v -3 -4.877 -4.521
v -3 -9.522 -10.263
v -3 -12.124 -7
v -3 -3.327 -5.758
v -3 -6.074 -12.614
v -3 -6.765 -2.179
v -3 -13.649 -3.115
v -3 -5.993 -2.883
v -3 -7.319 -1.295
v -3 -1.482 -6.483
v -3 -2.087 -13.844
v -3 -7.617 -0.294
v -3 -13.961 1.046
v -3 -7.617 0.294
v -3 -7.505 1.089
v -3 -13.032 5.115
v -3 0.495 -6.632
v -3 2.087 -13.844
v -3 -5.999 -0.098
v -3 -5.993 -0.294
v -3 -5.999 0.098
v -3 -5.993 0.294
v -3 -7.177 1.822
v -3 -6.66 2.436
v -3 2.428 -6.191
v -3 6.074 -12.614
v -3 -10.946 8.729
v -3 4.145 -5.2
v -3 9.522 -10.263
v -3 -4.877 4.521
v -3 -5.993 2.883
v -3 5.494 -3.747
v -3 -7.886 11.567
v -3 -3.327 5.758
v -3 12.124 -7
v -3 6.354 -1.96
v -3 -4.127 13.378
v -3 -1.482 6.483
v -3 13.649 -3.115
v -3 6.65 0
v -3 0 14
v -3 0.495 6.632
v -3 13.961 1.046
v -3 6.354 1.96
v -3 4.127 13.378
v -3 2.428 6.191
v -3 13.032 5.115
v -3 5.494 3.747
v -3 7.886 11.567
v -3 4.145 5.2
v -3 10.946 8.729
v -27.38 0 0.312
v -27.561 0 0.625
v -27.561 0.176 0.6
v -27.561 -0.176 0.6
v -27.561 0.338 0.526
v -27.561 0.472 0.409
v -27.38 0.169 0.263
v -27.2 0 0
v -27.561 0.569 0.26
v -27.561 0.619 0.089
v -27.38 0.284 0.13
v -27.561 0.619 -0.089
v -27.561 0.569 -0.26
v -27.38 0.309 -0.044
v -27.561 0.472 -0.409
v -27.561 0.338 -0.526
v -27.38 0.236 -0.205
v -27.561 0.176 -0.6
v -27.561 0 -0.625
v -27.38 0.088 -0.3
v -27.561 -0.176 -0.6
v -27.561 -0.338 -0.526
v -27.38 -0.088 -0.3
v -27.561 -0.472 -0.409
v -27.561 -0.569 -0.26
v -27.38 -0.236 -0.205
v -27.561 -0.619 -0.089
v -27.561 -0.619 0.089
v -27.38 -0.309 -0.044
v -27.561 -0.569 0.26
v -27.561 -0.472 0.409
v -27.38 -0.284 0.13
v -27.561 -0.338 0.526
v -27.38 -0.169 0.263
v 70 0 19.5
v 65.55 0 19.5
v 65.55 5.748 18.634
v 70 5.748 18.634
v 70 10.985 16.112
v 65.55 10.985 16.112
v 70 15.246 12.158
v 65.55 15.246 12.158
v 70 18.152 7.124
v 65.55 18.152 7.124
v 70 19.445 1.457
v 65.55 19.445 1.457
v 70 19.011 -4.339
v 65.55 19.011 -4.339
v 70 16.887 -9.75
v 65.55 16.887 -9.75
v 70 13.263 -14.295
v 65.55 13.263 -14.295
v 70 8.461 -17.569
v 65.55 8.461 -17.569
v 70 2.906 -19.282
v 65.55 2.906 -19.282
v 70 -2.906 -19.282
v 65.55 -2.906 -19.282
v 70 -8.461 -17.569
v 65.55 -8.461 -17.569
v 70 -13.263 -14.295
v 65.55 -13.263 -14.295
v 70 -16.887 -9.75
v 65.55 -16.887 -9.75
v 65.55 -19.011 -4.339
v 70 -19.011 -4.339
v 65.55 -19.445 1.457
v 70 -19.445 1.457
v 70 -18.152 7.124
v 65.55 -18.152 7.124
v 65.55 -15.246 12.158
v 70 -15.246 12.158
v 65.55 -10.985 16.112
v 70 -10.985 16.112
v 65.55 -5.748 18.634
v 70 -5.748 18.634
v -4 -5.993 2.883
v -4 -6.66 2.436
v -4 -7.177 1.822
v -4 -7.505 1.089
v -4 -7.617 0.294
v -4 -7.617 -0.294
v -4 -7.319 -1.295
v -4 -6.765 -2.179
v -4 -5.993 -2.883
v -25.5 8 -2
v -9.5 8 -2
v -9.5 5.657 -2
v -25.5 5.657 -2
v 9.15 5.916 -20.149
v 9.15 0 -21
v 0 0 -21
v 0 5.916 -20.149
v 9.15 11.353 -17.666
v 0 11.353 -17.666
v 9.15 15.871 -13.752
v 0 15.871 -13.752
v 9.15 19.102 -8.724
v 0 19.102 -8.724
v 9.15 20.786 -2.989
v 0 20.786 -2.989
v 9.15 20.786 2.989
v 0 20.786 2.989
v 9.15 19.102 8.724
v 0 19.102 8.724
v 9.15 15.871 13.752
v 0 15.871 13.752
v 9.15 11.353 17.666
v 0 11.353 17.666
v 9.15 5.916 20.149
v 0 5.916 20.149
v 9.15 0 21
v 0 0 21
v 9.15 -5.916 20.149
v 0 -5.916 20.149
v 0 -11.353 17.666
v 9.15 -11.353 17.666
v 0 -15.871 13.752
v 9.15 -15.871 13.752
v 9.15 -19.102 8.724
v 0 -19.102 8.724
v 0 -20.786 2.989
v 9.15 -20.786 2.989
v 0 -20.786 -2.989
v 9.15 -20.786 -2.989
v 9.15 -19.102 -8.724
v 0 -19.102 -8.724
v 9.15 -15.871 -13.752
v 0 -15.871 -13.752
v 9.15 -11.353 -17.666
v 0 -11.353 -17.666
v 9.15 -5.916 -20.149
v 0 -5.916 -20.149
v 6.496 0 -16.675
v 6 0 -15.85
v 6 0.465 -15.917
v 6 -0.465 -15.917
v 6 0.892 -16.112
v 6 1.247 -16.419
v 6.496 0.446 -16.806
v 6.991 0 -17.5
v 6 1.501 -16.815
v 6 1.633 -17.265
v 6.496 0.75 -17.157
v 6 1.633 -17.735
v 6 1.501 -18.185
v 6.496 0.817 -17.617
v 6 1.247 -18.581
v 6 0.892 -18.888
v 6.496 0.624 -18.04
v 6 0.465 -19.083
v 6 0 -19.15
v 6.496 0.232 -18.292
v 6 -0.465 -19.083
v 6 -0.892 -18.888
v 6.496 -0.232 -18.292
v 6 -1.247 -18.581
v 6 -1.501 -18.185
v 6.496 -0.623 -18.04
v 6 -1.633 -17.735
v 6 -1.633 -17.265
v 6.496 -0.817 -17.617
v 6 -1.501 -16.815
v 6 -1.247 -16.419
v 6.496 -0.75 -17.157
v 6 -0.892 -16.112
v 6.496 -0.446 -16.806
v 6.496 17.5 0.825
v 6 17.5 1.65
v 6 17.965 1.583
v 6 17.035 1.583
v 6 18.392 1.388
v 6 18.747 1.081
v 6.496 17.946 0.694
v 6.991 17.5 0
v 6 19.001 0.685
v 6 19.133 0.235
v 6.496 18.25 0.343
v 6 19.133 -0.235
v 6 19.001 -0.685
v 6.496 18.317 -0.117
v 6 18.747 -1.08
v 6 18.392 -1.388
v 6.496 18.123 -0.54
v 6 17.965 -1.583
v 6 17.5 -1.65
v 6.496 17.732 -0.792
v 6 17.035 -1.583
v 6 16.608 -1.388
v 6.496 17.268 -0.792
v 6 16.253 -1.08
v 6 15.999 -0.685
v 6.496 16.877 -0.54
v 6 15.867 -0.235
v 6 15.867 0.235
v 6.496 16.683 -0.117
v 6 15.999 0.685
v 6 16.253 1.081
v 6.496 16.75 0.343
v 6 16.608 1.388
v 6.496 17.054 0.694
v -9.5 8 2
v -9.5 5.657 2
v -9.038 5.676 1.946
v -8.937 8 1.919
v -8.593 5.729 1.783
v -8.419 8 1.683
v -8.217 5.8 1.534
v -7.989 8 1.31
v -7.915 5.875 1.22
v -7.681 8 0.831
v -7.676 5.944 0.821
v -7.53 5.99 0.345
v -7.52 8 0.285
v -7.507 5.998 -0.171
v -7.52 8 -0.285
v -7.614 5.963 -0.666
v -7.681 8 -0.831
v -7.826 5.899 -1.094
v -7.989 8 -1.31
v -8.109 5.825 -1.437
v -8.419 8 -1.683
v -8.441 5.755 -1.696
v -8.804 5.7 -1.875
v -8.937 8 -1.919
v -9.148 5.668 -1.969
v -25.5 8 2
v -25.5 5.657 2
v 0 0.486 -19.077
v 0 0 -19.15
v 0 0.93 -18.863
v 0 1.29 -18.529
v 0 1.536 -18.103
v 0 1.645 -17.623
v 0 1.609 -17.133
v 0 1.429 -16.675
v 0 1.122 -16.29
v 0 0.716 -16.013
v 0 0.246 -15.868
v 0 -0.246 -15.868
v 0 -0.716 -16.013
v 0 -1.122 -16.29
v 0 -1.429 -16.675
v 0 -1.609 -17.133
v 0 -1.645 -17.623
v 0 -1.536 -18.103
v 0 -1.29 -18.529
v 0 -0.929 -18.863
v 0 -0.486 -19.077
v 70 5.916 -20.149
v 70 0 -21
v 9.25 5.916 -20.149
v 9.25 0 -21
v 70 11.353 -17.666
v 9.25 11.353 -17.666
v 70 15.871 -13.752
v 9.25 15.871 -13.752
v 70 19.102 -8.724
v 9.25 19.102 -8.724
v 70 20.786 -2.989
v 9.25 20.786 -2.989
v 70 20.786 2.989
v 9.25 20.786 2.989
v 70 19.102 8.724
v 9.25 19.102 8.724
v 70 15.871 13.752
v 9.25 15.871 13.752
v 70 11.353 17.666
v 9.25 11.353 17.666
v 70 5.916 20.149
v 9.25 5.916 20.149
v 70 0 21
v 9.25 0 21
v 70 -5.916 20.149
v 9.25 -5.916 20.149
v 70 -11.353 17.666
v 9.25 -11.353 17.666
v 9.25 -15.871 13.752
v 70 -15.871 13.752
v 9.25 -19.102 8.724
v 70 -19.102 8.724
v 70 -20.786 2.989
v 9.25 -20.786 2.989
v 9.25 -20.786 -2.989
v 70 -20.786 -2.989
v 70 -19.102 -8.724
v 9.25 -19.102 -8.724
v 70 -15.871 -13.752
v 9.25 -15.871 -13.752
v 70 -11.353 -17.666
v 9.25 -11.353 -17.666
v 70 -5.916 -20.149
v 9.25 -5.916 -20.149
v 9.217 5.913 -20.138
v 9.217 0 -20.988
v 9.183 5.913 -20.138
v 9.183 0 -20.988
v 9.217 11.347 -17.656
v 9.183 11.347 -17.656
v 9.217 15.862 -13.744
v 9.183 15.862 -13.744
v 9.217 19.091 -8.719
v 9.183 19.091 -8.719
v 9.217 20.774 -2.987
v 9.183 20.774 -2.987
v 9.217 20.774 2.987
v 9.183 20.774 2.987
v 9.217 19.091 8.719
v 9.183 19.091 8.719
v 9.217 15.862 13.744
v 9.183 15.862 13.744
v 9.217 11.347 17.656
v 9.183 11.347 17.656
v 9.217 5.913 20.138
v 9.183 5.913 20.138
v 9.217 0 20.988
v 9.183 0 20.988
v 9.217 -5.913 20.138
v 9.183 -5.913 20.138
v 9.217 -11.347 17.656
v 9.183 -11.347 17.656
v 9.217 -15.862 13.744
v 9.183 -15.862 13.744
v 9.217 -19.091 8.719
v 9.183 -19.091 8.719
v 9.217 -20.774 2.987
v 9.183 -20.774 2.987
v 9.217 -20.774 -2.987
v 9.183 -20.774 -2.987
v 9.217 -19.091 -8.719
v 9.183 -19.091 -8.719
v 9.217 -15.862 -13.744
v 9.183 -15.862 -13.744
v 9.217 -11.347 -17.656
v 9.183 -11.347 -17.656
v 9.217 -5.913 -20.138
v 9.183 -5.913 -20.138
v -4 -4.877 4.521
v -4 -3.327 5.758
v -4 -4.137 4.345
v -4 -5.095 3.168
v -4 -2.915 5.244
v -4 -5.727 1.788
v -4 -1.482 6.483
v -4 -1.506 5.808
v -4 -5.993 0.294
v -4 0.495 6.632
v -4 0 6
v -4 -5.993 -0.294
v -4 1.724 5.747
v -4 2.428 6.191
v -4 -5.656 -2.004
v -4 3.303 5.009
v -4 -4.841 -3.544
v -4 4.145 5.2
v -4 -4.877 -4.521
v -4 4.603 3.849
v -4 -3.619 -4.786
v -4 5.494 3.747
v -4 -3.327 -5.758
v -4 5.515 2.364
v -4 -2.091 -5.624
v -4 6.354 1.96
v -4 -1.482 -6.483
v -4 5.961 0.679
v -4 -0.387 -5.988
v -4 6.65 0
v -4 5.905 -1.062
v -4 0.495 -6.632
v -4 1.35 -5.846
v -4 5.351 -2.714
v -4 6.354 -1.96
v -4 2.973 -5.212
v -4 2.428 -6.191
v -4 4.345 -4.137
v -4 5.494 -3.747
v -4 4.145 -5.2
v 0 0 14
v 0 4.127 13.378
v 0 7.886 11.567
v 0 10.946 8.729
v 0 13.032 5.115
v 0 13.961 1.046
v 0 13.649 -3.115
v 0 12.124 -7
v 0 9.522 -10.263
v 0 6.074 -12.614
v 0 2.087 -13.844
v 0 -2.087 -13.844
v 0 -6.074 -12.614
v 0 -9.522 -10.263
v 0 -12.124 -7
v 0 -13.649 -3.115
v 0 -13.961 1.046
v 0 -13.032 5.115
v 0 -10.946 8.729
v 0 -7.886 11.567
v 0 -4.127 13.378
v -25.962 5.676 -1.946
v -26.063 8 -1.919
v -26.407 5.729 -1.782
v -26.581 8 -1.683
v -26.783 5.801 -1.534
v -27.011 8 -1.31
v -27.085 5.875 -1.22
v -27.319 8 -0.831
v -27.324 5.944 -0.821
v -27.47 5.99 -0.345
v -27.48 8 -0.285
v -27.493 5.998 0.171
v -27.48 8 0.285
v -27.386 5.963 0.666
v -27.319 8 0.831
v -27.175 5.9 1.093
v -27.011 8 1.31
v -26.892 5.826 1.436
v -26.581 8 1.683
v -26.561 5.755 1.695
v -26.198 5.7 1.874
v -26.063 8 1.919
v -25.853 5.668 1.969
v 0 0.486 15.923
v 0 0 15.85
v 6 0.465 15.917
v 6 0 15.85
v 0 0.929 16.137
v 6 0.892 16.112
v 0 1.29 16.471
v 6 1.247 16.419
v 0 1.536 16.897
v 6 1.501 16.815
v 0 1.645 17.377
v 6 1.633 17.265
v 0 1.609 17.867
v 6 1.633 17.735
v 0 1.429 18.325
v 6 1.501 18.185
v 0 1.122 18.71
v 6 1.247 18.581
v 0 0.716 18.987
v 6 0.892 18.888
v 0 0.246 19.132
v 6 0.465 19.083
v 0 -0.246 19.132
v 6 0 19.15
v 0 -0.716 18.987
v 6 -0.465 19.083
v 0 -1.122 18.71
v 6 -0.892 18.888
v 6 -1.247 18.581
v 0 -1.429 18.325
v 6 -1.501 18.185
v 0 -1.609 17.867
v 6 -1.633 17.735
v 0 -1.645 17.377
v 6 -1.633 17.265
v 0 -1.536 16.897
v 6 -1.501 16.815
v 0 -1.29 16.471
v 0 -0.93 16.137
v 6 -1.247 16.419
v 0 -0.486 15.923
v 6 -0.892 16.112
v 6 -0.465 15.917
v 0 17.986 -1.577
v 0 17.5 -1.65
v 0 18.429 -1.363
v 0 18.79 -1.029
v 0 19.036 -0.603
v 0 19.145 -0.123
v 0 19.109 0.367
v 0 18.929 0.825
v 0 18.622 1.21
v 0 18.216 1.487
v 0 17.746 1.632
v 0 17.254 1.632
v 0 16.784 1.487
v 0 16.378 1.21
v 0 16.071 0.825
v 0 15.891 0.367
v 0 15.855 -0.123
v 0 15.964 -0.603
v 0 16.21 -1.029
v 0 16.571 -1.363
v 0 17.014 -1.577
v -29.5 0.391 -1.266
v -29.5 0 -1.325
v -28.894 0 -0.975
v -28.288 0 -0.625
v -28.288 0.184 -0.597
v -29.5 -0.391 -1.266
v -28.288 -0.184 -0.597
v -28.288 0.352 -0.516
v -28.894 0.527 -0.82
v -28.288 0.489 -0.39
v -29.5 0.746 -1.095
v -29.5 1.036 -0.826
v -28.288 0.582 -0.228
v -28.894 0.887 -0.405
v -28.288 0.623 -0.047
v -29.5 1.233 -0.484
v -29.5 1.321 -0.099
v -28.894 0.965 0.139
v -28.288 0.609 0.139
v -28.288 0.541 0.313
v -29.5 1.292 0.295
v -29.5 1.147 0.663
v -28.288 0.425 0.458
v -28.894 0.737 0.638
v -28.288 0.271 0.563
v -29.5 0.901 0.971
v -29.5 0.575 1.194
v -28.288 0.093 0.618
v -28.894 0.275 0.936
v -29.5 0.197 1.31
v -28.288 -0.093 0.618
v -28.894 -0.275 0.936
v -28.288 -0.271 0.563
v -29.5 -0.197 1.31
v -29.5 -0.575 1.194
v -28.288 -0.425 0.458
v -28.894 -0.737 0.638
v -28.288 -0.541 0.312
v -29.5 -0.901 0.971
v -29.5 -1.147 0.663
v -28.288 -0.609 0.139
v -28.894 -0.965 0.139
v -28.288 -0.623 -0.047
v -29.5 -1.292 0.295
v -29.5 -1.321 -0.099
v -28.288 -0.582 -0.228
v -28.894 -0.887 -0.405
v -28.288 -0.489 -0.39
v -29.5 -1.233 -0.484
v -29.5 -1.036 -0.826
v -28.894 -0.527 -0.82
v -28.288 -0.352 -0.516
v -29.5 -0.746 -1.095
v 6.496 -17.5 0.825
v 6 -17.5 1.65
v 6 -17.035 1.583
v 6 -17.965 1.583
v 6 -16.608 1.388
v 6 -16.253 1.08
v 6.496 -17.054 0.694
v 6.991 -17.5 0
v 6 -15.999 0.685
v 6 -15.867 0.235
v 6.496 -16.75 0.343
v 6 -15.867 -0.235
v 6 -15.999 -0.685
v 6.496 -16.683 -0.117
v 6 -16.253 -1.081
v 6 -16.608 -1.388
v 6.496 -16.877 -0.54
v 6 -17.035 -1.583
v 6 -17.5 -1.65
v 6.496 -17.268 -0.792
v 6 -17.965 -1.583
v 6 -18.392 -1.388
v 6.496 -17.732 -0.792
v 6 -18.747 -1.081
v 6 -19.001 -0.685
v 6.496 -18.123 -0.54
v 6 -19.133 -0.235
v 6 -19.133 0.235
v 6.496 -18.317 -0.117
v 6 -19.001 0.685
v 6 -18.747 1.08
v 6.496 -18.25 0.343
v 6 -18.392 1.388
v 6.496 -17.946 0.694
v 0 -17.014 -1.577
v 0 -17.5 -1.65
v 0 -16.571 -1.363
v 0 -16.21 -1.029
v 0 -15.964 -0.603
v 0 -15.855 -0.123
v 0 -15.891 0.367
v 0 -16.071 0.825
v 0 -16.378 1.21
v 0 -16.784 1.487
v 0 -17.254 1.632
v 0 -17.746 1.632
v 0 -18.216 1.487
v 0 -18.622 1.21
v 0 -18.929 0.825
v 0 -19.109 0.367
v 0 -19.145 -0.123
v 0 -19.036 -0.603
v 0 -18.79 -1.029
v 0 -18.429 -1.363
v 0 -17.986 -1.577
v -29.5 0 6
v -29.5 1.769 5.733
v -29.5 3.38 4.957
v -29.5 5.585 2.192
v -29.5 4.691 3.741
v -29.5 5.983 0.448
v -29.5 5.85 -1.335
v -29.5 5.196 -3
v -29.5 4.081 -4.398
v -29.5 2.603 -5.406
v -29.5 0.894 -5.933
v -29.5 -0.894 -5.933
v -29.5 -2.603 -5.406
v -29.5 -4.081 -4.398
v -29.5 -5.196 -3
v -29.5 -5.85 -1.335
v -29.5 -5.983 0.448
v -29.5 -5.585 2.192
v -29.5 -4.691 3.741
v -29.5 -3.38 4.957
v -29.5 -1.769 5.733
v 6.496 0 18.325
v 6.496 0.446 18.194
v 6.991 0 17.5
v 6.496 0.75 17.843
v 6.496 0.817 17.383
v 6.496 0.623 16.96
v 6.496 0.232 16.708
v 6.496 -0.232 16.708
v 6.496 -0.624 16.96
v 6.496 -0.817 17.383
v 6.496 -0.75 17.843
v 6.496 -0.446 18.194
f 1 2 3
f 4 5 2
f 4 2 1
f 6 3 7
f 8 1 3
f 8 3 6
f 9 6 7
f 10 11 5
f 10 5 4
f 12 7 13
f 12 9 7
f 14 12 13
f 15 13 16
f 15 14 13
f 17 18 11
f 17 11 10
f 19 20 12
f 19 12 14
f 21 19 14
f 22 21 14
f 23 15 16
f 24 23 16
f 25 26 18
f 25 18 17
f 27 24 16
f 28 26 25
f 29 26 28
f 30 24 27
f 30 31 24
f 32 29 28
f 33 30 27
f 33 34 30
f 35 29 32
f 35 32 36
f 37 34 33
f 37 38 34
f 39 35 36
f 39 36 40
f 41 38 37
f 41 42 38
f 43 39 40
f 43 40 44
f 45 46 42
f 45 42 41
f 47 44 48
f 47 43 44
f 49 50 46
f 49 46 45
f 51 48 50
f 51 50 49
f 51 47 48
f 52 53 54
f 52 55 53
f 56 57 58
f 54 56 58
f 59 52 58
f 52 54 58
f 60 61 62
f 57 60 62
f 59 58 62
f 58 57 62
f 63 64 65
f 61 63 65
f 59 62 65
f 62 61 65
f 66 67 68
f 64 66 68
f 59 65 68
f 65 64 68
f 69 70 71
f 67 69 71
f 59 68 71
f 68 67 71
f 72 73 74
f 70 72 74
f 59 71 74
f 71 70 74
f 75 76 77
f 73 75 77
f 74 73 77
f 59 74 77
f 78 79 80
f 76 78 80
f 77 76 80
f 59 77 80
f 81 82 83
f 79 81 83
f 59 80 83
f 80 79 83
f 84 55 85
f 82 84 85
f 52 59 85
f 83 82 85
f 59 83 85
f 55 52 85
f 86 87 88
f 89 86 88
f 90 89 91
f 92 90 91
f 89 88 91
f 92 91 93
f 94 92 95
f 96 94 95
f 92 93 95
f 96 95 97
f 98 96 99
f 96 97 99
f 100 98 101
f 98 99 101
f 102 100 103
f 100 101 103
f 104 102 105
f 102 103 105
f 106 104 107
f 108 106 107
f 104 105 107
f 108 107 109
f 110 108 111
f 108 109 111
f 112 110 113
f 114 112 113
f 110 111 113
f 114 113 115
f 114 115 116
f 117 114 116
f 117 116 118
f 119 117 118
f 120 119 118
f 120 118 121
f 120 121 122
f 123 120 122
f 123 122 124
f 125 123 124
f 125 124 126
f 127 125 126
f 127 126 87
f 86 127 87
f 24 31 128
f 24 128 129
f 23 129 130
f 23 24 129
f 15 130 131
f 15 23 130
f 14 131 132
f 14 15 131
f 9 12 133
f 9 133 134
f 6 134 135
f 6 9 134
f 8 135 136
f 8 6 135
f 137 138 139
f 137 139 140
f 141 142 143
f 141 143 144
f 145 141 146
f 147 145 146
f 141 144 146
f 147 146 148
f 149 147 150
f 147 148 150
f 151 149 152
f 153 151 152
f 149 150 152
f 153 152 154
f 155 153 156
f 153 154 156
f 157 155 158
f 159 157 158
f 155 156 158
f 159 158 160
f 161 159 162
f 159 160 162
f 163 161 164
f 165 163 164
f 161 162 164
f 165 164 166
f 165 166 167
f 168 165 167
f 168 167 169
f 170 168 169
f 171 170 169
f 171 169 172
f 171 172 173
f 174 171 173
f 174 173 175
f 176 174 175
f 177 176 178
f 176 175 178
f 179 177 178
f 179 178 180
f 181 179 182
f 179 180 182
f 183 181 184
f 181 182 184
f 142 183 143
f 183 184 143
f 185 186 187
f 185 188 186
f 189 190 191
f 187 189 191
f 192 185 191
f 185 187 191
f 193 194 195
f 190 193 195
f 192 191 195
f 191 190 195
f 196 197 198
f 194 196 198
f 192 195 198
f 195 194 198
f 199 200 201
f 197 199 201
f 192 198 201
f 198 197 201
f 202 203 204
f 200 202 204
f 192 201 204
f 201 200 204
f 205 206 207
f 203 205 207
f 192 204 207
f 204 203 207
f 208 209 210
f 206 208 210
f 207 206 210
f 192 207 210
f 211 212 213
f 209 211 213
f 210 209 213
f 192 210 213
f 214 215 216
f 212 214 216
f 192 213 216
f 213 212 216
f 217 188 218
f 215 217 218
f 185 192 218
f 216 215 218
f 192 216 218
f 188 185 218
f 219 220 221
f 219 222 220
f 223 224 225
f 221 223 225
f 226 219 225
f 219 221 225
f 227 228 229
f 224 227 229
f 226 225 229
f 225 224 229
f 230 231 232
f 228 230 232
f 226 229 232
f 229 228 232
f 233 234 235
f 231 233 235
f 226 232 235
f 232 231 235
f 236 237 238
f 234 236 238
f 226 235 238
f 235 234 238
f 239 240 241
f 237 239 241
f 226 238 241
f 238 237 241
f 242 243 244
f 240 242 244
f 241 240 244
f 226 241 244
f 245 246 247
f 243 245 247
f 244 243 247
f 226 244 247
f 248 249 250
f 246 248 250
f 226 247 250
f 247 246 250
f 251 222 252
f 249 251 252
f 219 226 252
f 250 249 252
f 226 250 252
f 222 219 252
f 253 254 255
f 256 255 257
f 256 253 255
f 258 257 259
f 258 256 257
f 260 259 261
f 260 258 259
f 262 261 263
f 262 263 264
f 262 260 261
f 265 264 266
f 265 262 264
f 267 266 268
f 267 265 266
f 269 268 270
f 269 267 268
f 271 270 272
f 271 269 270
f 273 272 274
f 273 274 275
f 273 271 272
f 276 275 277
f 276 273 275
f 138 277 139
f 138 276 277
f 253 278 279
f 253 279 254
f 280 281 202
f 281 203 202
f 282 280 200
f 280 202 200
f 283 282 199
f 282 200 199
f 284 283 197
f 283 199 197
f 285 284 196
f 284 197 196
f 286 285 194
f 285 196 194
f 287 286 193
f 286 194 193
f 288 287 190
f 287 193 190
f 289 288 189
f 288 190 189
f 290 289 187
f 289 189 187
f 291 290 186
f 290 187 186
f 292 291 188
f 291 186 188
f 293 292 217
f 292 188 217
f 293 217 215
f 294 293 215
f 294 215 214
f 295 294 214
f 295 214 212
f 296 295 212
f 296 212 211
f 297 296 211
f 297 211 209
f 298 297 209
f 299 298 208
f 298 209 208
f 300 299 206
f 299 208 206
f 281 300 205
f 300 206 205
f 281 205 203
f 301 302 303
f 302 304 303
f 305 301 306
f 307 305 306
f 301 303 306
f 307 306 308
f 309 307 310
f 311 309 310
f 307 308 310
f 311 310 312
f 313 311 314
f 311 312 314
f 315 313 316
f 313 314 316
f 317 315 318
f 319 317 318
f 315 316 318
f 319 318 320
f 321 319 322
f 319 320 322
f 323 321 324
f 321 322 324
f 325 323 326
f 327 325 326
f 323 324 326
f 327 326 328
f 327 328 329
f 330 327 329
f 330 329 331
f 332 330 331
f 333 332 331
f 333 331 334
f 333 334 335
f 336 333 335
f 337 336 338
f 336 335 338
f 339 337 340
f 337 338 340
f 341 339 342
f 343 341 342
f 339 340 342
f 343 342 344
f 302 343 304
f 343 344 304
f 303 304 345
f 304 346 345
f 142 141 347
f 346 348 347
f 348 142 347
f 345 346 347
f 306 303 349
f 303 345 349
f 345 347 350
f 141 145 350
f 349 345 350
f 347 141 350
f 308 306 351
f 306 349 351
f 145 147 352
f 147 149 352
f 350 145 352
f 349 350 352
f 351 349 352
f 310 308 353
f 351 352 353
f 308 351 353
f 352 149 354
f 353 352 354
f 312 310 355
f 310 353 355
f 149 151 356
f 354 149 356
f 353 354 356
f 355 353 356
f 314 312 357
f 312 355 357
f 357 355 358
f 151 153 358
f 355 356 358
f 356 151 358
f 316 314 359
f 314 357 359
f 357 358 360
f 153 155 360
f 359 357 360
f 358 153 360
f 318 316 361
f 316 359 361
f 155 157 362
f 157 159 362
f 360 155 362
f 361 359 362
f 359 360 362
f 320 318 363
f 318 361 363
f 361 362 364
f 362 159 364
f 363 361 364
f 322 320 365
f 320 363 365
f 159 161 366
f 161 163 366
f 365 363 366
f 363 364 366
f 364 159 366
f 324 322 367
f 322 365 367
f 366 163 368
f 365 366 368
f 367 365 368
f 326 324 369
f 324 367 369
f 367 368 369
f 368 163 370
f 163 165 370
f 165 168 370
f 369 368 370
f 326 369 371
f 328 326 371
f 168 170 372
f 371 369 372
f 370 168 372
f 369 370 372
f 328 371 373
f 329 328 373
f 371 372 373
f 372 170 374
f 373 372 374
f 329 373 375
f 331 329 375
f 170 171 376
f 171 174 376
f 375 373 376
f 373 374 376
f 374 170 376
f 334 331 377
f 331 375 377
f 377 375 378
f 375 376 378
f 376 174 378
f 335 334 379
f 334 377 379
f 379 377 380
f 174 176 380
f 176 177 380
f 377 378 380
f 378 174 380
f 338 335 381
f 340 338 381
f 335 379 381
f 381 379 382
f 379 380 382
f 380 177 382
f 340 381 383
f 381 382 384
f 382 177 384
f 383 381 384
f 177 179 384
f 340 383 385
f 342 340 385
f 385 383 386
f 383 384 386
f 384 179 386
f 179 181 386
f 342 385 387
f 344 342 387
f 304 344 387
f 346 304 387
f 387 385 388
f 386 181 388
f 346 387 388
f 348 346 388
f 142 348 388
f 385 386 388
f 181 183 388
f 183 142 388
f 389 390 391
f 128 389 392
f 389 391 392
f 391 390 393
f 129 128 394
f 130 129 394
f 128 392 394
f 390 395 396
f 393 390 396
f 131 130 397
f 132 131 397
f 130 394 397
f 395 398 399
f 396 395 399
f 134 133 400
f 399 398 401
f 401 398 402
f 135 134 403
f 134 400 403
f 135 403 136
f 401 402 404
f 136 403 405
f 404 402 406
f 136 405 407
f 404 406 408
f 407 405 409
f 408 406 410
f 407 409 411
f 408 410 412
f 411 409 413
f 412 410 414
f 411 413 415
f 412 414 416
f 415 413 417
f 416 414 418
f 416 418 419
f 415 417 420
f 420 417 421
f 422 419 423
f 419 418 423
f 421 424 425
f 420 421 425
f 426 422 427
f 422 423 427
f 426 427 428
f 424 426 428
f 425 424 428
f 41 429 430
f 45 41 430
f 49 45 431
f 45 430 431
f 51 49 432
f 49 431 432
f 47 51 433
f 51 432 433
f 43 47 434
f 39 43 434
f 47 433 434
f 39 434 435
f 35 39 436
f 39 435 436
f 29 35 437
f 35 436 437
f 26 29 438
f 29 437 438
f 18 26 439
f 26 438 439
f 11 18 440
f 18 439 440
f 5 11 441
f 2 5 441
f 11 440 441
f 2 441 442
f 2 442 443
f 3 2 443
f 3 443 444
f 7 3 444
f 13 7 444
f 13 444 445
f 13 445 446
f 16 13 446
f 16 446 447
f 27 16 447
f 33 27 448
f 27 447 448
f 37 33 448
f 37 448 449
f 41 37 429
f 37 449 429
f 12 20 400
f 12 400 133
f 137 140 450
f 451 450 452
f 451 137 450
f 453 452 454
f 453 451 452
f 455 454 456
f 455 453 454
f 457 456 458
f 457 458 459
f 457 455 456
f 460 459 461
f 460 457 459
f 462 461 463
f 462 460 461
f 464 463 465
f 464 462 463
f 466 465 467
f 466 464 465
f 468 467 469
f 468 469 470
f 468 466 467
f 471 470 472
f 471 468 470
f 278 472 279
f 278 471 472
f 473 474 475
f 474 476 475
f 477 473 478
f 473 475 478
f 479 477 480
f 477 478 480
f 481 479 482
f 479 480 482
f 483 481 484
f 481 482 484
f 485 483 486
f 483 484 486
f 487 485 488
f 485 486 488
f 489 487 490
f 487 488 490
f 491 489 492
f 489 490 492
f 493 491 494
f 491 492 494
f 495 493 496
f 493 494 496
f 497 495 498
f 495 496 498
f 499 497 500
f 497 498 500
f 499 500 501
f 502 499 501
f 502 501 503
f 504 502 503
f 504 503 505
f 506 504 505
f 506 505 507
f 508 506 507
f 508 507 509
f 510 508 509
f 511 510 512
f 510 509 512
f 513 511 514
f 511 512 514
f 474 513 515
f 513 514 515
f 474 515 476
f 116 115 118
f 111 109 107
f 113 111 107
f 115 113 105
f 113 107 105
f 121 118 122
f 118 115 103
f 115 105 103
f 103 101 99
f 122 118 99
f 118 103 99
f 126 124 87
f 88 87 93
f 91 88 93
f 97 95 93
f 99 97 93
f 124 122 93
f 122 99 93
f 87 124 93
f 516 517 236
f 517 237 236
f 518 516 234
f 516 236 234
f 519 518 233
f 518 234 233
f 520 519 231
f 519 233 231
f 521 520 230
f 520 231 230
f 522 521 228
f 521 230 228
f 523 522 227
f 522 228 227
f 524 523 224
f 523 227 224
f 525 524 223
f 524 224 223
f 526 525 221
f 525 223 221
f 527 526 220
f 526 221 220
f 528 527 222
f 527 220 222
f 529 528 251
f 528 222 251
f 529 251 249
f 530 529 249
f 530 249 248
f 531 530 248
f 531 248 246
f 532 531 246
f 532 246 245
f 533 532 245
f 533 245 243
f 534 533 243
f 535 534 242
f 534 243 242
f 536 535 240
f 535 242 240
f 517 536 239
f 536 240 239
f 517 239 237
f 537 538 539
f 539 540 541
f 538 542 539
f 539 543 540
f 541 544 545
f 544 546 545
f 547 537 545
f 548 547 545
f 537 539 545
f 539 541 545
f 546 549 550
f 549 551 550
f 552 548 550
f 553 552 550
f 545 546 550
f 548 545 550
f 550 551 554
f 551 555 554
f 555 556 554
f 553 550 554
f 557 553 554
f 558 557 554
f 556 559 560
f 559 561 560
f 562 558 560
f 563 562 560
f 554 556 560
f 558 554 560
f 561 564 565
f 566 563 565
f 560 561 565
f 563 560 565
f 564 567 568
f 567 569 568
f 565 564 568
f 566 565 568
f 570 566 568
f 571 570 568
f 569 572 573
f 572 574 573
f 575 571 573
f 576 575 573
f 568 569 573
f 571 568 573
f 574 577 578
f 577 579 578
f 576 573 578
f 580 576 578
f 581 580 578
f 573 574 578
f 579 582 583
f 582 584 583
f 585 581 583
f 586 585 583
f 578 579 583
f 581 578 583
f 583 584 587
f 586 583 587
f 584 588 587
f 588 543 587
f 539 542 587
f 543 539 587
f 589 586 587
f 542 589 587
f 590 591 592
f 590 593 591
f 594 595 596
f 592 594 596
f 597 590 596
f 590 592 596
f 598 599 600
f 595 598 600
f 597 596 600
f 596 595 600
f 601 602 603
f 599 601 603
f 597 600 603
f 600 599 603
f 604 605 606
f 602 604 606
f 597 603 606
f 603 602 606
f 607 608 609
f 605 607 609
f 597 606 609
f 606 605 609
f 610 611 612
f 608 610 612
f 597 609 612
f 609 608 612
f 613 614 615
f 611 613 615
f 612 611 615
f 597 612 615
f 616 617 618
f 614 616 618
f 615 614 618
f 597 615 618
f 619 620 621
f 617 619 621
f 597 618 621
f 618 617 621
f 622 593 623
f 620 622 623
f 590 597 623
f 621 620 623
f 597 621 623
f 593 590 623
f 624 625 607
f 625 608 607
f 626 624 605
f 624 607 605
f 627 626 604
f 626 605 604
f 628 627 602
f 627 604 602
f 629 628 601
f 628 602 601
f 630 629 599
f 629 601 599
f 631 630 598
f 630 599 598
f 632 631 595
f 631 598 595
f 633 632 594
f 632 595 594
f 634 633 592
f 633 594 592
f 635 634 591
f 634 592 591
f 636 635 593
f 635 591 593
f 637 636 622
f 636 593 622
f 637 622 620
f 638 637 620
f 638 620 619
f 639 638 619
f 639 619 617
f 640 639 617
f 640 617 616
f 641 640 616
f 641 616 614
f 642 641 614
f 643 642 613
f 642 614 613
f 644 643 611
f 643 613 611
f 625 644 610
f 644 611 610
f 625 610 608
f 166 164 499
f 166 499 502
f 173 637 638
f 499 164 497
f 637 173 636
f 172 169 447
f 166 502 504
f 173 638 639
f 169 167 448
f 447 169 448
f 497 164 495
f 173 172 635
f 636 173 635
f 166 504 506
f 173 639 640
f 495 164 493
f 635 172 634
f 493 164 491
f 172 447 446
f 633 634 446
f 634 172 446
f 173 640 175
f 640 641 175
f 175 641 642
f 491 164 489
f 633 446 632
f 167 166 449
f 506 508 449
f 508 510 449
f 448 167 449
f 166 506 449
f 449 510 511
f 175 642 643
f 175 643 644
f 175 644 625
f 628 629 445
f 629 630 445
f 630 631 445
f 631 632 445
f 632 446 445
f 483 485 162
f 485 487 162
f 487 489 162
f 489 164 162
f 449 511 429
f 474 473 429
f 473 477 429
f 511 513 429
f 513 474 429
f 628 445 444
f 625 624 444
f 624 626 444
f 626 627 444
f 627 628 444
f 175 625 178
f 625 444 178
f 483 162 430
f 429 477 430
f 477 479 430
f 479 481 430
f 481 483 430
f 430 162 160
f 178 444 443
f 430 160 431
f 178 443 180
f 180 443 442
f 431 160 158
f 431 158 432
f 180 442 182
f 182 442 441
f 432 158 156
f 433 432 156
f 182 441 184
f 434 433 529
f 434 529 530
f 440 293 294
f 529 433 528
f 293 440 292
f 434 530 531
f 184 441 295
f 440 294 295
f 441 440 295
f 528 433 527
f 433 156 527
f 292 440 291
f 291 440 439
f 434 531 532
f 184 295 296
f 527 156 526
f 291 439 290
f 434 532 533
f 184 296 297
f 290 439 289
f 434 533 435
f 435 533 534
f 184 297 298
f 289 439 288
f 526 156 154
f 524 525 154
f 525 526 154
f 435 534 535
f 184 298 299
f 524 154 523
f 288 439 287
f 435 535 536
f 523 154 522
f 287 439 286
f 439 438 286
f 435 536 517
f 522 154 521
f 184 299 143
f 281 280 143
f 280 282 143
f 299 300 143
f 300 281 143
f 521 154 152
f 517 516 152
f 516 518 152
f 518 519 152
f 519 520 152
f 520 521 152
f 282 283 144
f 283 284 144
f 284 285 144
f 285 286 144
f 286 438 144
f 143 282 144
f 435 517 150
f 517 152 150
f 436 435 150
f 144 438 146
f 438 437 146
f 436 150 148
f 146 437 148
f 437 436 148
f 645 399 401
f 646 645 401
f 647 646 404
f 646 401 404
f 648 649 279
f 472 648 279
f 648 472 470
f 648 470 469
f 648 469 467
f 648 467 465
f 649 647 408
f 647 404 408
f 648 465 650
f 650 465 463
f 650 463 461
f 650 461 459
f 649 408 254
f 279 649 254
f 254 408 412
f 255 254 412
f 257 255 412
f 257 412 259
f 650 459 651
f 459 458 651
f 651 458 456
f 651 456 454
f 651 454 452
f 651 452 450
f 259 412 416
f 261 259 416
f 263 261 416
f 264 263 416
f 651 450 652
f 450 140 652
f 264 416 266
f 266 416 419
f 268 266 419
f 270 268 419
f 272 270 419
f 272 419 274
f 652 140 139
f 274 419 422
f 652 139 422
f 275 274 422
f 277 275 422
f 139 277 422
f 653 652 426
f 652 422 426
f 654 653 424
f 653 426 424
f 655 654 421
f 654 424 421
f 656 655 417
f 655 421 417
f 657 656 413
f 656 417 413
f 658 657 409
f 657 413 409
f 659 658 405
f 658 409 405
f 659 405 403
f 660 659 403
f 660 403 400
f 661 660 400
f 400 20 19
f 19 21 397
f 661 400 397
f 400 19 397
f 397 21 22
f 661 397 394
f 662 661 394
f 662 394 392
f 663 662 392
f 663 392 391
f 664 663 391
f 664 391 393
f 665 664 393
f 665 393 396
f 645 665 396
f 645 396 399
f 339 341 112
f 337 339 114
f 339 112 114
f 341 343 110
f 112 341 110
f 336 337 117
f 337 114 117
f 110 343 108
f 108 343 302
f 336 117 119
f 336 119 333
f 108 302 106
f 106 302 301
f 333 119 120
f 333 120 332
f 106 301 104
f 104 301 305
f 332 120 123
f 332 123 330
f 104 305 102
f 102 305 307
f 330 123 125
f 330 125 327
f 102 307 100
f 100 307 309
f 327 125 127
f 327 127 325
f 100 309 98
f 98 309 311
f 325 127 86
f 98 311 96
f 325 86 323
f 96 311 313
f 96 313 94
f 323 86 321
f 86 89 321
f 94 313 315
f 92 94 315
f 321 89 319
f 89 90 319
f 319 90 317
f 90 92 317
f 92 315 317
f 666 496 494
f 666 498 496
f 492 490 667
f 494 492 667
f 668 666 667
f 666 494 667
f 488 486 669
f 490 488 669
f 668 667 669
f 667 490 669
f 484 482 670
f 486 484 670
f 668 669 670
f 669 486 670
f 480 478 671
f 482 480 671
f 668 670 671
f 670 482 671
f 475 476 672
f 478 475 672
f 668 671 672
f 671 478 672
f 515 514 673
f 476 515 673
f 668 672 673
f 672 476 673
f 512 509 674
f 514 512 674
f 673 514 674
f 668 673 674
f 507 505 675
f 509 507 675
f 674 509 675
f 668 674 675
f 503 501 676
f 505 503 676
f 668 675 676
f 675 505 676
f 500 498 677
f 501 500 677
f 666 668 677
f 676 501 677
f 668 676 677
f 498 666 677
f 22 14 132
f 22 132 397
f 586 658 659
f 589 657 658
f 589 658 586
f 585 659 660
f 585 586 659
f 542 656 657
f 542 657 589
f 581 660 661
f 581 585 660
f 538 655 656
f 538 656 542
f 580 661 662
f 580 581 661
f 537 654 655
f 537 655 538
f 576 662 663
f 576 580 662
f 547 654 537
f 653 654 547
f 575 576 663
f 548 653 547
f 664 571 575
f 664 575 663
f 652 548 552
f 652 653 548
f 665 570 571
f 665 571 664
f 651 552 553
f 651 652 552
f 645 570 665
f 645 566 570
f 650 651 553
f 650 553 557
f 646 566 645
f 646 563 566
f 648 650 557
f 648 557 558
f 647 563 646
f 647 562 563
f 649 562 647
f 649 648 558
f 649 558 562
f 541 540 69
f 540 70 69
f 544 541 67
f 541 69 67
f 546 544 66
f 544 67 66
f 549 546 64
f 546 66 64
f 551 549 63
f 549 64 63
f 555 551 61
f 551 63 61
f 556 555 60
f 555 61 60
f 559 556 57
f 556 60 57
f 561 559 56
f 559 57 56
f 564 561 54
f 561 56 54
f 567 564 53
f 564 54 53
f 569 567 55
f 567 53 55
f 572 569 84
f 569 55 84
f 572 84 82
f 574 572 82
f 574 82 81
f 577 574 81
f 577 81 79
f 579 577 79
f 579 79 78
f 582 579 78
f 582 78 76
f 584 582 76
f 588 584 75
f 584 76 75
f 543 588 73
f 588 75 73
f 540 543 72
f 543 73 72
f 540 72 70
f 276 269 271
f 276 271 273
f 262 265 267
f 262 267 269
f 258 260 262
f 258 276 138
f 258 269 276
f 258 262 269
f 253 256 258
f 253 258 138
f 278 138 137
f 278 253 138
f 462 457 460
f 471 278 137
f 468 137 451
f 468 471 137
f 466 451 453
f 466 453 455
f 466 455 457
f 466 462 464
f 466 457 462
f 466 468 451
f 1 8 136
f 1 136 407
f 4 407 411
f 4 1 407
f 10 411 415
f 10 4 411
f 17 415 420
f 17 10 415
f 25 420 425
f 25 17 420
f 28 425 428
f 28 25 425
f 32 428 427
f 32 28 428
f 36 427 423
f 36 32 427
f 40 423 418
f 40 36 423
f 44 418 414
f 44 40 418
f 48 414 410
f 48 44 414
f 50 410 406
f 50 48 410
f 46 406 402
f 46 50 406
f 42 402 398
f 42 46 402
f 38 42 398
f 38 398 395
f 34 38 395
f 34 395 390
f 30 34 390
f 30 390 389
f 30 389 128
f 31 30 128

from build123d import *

# Parameters (mm, degrees)
SKETCH2_R                = 14
BOSS_EXTRUDE1_DEPTH      = 3
SKETCH3_R                = 6
BOSS_EXTRUDE2_DEPTH      = 26.5
BOSS_EXTRUDE3_DEPTH      = 1
BOSS_EXTRUDE4_REACH      = 80.626
BOSS_EXTRUDE4_END_RADIUS = 6
HOLE1_D                  = 39
HOLE1_DEPTH              = 4.45
HOLE2_D                  = 3.3
HOLE2_DEPTH              = 6
HOLE2_TIP                = 0.991420021
HOLE3_D                  = 3.3
HOLE3_DEPTH              = 6
HOLE3_TIP                = 0.991420021
HOLE4_D                  = 3.3
HOLE4_DEPTH              = 6
HOLE4_TIP                = 0.991420021
HOLE5_D                  = 3.3
HOLE5_DEPTH              = 6
HOLE5_TIP                = 0.991420021
HOLE6_D                  = 1.25
HOLE6_DEPTH              = 1.939156082
HOLE6_CSINK_D            = 2.65
HOLE6_CSINK_ANGLE        = 60
HOLE6_TIP                = 0.360843918


with BuildPart() as part:
    # Sketch1 → Revolve1 (revolve)
    with BuildSketch(Plane.XY, mode=Mode.PRIVATE) as revolve1_sk:
        with BuildLine():
            Line((0, 21), (0, 0))
            Line((0, 0), (70, 0))
            Line((70, 0), (70, 21))
            Line((70, 21), (9.25, 21))
            ThreePointArc((9.25, 21), (9.2, 20.98660254), (9.15, 21))
            Line((9.15, 21), (0, 21))
        make_face()
    revolve(revolve1_sk.sketch.rotate(Axis((0, 0, 0), (1, 0, 0)), 270), axis=Axis((0, 0, 0), (1, 0, 0)))

    # Sketch2 → Boss-Extrude1 (add)
    with BuildSketch(Plane.ZY):
        Circle(SKETCH2_R)
    extrude(amount=BOSS_EXTRUDE1_DEPTH)

    # Sketch3 → Boss-Extrude2 (add)
    with BuildSketch(Plane.ZY.offset(3)):
        Circle(SKETCH3_R)
    extrude(amount=BOSS_EXTRUDE2_DEPTH)

    # Sketch4 → Boss-Extrude3 (add)
    with BuildSketch(Plane.ZY.offset(3)):
        with BuildLine():
            Line((0.293916284, -7.616838781), (0.293916284, -5.992796778))
            ThreePointArc((0.293916284, -5.992796778), (0, 6), (-0.293916284, -5.992796778))
            Line((-0.293916284, -5.992796778), (-0.293916284, -7.616838781))
            ThreePointArc((-0.293916284, -7.616838781), (-1.755912185, -7.072113956), (-2.882513969, -5.992796778))
            ThreePointArc((-2.882513969, -5.992796778), (0, 6.65), (2.882513969, -5.992796778))
            ThreePointArc((2.882513969, -5.992796778), (1.821852016, -7.17721696), (0.293916284, -7.616838781))
        make_face()
    extrude(amount=BOSS_EXTRUDE3_DEPTH)

    # Boss-Extrude4: up to this cylinder (the profile starts outside it)
    boss_extrude4_end = Plane(origin=(-17.5, 0, 0), z_dir=(1, 0, 0)) * Cylinder(BOSS_EXTRUDE4_END_RADIUS, 174.252, mode=Mode.PRIVATE)
    # Sketch5 → Boss-Extrude4 (add, up to the surface)
    with BuildSketch(Plane(origin=(0, 8, 0), x_dir=(-1, 0, 0), z_dir=(0, 1, 0)), mode=Mode.PRIVATE) as boss_extrude4_sk1:
        with BuildLine():
            Line((9.5, -2), (25.5, -2))
            ThreePointArc((25.5, -2), (27.5, 0), (25.5, 2))
            Line((25.5, 2), (9.5, 2))
            ThreePointArc((9.5, 2), (7.5, 0), (9.5, -2))
        make_face()
    boss_extrude4_tool1 = extrude(boss_extrude4_sk1.sketch, amount=-BOSS_EXTRUDE4_REACH, mode=Mode.PRIVATE) - boss_extrude4_end
    add(boss_extrude4_tool1.solids().sort_by_distance((-17.5, 8, 0))[0])

    # Hole1
    with Locations(Plane(origin=(70, 0, 0), x_dir=(0, 0, -1), z_dir=(1, 0, 0))):
        with Locations((0, 0)):
            Hole(HOLE1_D / 2, depth=HOLE1_DEPTH)

    # Hole2
    with Locations(Plane.ZY):
        with Locations((-17.5, 3.0543e-05)):
            Hole(HOLE2_D / 2, depth=HOLE2_DEPTH)
            with Locations((0, 0, -(HOLE2_DEPTH + HOLE2_TIP / 2))):  # 118° drill point
                Cone(0, HOLE2_D / 2, HOLE2_TIP, mode=Mode.SUBTRACT)

    # Hole3
    with Locations(Plane.ZY):
        with Locations((-3.0543e-05, -17.5)):
            Hole(HOLE3_D / 2, depth=HOLE3_DEPTH)
            with Locations((0, 0, -(HOLE3_DEPTH + HOLE3_TIP / 2))):  # 118° drill point
                Cone(0, HOLE3_D / 2, HOLE3_TIP, mode=Mode.SUBTRACT)

    # Hole4
    with Locations(Plane.ZY):
        with Locations((17.5, -3.0543e-05)):
            Hole(HOLE4_D / 2, depth=HOLE4_DEPTH)
            with Locations((0, 0, -(HOLE4_DEPTH + HOLE4_TIP / 2))):  # 118° drill point
                Cone(0, HOLE4_D / 2, HOLE4_TIP, mode=Mode.SUBTRACT)

    # Hole5
    with Locations(Plane.ZY):
        with Locations((3.0543e-05, 17.5)):
            Hole(HOLE5_D / 2, depth=HOLE5_DEPTH)
            with Locations((0, 0, -(HOLE5_DEPTH + HOLE5_TIP / 2))):  # 118° drill point
                Cone(0, HOLE5_D / 2, HOLE5_TIP, mode=Mode.SUBTRACT)

    # Hole6
    with Locations(Plane.ZY.offset(29.5)):
        with Locations((0, 0)):
            CounterSinkHole(HOLE6_D / 2, HOLE6_CSINK_D / 2, depth=HOLE6_DEPTH, counter_sink_angle=HOLE6_CSINK_ANGLE)
            with Locations((0, 0, -(HOLE6_DEPTH + HOLE6_TIP / 2))):  # 120° drill point
                Cone(0, HOLE6_D / 2, HOLE6_TIP, mode=Mode.SUBTRACT)


solid = part.part
